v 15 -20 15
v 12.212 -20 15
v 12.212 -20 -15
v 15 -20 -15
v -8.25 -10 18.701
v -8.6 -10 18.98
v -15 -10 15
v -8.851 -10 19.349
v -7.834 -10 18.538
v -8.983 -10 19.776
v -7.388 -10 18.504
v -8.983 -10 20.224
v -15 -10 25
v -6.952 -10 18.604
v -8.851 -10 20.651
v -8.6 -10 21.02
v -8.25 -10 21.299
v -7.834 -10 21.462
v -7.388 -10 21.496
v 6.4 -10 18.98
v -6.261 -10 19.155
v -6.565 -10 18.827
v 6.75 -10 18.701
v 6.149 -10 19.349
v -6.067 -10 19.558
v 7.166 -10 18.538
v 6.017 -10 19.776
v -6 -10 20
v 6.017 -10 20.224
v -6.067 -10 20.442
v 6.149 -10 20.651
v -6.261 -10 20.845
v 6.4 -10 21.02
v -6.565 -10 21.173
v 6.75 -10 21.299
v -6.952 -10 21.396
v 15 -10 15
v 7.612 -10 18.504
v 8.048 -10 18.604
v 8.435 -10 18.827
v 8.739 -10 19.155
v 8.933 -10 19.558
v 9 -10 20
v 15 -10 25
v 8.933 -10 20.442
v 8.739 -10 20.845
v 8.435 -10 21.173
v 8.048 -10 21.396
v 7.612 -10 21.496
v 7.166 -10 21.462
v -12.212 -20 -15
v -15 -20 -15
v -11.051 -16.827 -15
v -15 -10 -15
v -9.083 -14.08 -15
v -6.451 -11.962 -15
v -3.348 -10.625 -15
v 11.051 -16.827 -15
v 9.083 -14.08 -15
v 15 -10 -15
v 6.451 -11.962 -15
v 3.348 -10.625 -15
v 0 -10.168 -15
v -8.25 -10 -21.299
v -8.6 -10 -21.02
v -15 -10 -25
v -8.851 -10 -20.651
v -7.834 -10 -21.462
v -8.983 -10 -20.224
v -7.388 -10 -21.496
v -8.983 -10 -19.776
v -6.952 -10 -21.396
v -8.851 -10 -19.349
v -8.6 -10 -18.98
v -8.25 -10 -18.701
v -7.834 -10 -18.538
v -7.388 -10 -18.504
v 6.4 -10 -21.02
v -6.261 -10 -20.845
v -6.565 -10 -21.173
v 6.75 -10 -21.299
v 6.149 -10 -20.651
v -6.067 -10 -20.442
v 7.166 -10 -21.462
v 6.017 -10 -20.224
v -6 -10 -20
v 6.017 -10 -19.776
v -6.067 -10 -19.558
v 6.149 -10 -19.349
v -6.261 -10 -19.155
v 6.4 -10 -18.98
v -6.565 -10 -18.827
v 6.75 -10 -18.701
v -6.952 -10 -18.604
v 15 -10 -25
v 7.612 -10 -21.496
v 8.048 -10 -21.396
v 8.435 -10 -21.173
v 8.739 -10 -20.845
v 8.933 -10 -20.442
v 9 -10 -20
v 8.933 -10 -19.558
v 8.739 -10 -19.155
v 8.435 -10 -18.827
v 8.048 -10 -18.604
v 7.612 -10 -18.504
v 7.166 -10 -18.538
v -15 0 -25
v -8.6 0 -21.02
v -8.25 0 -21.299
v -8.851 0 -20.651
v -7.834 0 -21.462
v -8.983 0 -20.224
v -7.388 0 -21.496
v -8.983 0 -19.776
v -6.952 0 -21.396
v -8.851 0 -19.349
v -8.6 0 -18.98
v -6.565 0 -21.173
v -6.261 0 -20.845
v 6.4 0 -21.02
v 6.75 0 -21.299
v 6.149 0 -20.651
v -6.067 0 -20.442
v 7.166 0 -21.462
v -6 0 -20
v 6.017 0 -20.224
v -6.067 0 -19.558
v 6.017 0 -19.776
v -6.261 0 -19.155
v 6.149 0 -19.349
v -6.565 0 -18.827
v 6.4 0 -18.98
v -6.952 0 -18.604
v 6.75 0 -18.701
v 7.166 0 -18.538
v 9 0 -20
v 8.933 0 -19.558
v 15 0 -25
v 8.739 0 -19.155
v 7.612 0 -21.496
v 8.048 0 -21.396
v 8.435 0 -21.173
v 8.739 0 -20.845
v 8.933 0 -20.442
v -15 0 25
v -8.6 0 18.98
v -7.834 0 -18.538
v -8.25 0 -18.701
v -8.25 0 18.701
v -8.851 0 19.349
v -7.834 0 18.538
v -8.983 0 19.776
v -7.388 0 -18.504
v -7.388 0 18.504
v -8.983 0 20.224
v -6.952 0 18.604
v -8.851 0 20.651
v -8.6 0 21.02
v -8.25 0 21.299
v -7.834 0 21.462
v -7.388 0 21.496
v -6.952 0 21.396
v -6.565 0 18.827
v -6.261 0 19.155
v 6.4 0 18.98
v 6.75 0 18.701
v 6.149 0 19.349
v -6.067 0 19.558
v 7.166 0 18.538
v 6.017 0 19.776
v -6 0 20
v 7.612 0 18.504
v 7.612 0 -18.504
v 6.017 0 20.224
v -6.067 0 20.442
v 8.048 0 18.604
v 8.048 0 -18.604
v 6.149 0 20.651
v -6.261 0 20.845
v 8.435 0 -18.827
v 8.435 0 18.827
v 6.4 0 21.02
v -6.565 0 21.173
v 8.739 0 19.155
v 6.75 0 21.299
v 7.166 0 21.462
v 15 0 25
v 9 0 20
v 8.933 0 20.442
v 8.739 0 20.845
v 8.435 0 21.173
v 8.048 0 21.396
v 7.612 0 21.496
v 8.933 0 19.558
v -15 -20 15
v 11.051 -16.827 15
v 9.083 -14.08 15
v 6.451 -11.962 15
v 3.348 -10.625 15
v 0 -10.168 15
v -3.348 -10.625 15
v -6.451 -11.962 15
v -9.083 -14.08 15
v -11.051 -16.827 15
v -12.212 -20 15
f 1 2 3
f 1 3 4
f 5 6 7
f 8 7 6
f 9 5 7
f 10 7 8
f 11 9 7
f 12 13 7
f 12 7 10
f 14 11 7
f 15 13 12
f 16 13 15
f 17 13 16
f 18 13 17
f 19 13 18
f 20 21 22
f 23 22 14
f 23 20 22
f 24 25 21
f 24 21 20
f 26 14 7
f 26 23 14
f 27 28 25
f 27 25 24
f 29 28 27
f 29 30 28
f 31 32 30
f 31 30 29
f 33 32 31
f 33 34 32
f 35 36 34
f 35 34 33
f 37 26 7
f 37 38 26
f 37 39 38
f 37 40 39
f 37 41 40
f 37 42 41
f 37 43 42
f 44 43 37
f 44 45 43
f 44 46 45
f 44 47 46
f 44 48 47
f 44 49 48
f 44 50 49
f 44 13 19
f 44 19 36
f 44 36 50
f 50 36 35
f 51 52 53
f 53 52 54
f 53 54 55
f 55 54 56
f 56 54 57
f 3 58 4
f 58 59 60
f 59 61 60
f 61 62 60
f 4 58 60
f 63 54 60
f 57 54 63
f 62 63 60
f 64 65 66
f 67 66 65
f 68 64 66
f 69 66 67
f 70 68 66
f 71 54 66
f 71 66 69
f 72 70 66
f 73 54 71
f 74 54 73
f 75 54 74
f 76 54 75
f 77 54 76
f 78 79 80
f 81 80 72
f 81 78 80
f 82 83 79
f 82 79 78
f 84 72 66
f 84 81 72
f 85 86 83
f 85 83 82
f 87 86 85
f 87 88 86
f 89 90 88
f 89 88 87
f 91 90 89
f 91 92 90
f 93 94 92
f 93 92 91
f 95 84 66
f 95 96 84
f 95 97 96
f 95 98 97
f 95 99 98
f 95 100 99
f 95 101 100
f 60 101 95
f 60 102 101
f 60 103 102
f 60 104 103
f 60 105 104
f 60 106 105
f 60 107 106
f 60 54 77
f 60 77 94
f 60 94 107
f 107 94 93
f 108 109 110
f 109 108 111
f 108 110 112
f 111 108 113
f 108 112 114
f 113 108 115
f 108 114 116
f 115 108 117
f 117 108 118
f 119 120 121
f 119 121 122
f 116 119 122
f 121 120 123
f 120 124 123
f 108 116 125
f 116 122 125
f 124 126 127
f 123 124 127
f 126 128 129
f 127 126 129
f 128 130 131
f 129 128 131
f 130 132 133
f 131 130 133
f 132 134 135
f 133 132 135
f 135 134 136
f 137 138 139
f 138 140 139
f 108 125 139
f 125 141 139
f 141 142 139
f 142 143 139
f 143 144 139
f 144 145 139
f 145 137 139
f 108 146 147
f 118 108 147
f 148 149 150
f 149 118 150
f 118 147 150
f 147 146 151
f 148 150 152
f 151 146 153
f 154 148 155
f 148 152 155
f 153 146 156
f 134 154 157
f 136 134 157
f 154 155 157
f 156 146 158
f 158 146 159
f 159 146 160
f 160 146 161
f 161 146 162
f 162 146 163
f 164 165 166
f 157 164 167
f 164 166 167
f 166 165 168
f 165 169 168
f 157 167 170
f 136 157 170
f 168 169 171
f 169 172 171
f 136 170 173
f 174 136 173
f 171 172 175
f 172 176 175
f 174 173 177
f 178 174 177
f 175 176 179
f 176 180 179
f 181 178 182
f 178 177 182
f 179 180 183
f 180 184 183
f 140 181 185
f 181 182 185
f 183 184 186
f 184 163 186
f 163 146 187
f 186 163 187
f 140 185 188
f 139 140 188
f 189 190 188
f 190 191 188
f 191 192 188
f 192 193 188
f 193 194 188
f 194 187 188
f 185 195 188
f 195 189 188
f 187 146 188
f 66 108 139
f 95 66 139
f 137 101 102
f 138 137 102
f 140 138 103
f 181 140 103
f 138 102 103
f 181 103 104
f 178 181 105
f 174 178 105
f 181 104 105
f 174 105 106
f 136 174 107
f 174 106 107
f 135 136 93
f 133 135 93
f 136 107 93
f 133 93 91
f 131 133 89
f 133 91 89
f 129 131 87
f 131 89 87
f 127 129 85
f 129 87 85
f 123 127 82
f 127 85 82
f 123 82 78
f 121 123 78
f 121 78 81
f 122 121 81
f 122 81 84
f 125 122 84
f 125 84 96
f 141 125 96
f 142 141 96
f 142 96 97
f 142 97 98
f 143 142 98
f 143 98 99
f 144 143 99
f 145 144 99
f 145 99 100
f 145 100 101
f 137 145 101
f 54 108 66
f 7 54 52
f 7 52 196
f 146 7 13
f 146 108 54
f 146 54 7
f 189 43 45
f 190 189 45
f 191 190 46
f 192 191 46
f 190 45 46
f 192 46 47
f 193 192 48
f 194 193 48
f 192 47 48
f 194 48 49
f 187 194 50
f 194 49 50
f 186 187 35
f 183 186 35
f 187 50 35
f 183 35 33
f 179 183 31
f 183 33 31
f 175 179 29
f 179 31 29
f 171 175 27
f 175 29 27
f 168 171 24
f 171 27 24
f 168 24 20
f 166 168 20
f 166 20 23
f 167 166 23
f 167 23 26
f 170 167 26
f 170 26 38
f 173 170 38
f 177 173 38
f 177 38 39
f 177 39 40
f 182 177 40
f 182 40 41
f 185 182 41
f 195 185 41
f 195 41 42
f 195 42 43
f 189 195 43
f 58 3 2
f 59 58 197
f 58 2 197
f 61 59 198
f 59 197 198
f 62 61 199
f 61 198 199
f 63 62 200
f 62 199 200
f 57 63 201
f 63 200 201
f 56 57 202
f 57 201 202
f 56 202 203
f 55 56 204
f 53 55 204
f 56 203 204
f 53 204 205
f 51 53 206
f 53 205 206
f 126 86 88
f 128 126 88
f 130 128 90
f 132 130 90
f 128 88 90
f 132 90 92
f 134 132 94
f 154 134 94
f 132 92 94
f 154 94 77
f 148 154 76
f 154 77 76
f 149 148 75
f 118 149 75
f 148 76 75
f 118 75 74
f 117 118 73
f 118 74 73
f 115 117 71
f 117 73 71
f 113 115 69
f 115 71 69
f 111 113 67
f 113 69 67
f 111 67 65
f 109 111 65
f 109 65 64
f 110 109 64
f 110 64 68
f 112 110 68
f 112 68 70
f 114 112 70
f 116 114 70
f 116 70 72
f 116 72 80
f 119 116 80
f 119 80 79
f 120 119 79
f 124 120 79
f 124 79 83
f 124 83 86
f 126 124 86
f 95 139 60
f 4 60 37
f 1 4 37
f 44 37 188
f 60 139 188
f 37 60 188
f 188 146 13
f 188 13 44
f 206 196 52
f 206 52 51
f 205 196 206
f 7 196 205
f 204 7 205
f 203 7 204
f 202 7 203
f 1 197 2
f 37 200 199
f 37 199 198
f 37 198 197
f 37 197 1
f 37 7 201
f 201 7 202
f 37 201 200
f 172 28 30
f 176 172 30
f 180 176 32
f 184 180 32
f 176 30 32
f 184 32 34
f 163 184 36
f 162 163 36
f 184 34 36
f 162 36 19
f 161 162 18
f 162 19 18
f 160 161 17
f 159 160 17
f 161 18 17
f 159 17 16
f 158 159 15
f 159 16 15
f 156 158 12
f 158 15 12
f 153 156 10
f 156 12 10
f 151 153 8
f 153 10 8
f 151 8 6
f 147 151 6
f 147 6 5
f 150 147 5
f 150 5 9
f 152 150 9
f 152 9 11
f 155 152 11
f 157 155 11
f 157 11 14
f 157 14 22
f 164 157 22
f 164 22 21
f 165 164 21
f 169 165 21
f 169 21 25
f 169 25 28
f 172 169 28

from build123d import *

# Parameters (mm, degrees)
F0_W     = 30
F0_H     = 50
F1_DEPTH = 10
F2_R     = 1.5
F3_DEPTH = 10.001
F4_W     = 30
F4_H     = 30
F5_DEPTH = 10
F6_R     = 12.5
F7_DEPTH = 25.001
F8_DEPTH = 25.001


with BuildPart() as f1:
    # F0 (on Front) → F1 (new body)
    with BuildSketch(Plane.XZ):
        Rectangle(F0_W, F0_H)
    extrude(amount=F1_DEPTH)

    # F2 (on face) → F3 (cut, through all)
    with BuildSketch(Plane.XZ.offset(10)):
        with Locations((7.5, -20)):
            Circle(F2_R)
        with Locations((-7.5, -20)):
            Circle(F2_R)
        with Locations((7.5, 20)):
            Circle(F2_R)
        with Locations((-7.5, 20)):
            Circle(F2_R)
    extrude(amount=-F3_DEPTH, mode=Mode.SUBTRACT)

    # F4 (on face) → F5 (join)
    with BuildSketch(Plane.XZ.offset(10)):
        Rectangle(F4_W, F4_H)
    extrude(amount=F5_DEPTH)

    # F6 (on Top) → F7 (cut, through all)
    with BuildSketch(Plane.XY):
        with Locations((0, -22.66825)):
            Circle(F6_R)
    extrude(amount=-F7_DEPTH, mode=Mode.SUBTRACT)

    # F6 (on Top) → F8 (cut, through all)
    with BuildSketch(Plane.XY):
        with Locations((0, -22.66825)):
            Circle(F6_R)
    extrude(amount=F8_DEPTH, mode=Mode.SUBTRACT)


solid = f1.part
